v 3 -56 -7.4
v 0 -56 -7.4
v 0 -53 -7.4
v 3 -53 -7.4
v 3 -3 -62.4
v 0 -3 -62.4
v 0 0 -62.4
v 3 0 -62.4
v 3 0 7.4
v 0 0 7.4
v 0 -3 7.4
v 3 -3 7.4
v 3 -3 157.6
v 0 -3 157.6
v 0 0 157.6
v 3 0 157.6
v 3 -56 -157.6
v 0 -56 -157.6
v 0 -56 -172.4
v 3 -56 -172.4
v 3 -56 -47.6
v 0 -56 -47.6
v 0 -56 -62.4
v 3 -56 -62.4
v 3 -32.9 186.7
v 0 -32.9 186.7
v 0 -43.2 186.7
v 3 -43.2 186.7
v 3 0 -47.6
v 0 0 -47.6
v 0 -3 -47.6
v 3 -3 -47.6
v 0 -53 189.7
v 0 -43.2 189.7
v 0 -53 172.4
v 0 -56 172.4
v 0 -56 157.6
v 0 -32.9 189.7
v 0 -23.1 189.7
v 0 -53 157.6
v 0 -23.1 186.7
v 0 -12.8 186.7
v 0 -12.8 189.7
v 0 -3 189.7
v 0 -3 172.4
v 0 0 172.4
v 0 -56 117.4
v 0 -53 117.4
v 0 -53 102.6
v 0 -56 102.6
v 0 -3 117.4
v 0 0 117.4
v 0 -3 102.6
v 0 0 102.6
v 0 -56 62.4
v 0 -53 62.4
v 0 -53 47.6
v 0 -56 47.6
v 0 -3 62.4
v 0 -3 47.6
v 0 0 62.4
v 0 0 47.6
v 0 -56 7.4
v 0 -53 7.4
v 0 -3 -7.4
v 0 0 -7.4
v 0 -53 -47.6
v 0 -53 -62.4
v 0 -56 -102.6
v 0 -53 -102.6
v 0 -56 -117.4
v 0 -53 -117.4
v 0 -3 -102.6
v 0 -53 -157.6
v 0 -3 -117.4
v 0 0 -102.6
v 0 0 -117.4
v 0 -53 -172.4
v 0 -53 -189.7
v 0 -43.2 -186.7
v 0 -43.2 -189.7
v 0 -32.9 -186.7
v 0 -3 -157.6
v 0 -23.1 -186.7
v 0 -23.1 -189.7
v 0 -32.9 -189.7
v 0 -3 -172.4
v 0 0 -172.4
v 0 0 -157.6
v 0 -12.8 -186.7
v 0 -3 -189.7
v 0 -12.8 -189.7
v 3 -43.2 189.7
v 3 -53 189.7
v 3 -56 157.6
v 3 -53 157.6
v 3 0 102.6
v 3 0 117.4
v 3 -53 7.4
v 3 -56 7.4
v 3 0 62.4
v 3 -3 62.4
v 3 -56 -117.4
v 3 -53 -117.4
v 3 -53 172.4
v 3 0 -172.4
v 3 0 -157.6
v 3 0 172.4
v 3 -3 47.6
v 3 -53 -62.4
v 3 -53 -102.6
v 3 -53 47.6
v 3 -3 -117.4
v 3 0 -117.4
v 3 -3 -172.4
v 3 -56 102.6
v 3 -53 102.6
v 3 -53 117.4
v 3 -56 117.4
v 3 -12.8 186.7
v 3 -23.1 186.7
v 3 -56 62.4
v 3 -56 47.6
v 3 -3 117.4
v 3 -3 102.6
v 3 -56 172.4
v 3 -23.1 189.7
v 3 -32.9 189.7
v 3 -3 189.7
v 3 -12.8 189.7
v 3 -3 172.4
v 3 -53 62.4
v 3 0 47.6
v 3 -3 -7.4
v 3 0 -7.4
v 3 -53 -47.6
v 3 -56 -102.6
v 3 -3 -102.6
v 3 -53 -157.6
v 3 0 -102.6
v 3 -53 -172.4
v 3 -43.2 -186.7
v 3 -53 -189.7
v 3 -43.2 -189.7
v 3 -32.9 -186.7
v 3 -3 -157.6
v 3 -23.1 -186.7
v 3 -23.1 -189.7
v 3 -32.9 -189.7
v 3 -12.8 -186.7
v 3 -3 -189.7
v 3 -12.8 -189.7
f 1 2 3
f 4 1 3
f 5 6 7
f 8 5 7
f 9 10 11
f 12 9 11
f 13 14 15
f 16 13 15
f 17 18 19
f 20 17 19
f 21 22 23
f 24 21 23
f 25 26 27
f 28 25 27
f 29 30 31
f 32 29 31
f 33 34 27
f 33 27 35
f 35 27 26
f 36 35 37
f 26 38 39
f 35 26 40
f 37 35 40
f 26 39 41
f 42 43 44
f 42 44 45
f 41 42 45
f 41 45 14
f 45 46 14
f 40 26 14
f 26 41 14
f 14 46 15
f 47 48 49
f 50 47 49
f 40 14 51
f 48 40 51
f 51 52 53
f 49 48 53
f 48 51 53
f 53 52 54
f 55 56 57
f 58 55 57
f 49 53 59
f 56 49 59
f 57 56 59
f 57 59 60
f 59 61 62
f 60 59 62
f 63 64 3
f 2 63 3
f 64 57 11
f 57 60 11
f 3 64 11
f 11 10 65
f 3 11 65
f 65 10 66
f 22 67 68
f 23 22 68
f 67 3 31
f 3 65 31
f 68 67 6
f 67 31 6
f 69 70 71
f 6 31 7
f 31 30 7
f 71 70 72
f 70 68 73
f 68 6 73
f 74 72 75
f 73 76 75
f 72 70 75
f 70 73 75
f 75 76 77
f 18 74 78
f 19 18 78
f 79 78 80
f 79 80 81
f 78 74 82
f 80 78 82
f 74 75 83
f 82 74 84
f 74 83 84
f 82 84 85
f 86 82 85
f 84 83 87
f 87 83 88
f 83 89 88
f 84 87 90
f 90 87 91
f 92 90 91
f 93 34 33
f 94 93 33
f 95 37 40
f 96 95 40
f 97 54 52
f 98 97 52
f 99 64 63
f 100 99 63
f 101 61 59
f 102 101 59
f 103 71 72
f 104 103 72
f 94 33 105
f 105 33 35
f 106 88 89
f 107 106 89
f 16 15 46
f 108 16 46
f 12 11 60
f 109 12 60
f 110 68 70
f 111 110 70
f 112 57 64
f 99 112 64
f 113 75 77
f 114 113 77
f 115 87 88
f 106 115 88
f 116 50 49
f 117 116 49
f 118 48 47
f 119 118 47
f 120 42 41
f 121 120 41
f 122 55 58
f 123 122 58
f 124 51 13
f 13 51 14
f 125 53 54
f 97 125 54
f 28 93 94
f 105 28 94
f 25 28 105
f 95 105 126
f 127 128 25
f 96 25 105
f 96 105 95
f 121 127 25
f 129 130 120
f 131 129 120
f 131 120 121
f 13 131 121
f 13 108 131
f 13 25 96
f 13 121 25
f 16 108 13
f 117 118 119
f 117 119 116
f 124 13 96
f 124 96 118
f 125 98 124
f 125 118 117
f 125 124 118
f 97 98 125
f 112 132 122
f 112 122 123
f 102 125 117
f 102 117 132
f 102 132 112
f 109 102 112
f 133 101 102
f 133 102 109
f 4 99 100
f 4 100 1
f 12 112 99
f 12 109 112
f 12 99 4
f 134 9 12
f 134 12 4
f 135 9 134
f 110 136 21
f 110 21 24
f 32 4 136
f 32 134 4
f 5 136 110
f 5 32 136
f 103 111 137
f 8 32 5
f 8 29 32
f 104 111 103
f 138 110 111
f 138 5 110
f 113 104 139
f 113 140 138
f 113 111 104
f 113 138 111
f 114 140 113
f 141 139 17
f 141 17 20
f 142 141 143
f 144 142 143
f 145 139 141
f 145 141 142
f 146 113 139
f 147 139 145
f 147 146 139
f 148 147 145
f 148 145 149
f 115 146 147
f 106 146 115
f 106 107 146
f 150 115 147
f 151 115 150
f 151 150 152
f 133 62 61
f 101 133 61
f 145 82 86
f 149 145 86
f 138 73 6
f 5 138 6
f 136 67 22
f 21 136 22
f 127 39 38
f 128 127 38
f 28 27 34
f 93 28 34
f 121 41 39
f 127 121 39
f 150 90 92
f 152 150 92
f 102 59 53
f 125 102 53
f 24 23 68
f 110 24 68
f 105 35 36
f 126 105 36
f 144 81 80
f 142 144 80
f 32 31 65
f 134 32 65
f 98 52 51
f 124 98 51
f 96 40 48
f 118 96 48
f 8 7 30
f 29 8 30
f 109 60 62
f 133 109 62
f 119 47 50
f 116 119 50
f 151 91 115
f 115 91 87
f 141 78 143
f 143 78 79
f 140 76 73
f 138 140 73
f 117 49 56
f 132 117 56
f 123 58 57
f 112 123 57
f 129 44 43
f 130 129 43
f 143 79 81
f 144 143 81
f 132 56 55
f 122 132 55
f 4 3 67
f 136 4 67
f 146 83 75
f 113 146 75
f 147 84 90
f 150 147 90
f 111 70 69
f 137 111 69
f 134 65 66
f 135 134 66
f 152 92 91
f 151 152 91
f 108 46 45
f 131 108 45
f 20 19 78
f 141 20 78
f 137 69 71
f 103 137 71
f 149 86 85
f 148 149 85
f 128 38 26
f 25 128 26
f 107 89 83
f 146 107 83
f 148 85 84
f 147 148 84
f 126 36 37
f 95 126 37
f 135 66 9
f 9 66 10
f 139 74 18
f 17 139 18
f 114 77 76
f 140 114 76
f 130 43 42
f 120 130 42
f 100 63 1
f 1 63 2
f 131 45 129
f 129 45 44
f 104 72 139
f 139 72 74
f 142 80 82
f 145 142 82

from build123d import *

# Parameters (mm, degrees)
BOSS_EXTRUDE1_DEPTH = 3


with BuildPart() as part:
    # Sketch1 → Boss-Extrude1 (new body)
    with BuildSketch(Plane(origin=(0, 0, 0), x_dir=(0, 0, -1), z_dir=(1, 0, 0))):
        Polygon((7.4, 0), (-7.4, 0), (-7.4, -3), (-47.6, -3), (-47.6, 0), (-62.4, 0), (-62.4, -3), (-102.6, -3), (-102.6, 0), (-117.4, 0), (-117.4, -3), (-157.6, -3), (-157.6, 0), (-172.4, 0), (-172.4, -3), (-189.7, -3), (-189.7, -12.8), (-186.7, -12.8), (-186.7, -23.1), (-189.7, -23.1), (-189.7, -28), (-189.7, -32.9), (-186.7, -32.9), (-186.7, -43.2), (-189.7, -43.2), (-189.7, -53), (-172.4, -53), (-172.4, -56), (-157.6, -56), (-157.6, -53), (-117.4, -53), (-117.4, -56), (-102.6, -56), (-102.6, -53), (-62.4, -53), (-62.4, -56), (-47.6, -56), (-47.6, -53), (-7.4, -53), (-7.4, -56), (7.4, -56), (7.4, -53), (47.6, -53), (47.6, -56), (62.4, -56), (62.4, -53), (102.6, -53), (102.6, -56), (117.4, -56), (117.4, -53), (157.6, -53), (157.6, -56), (172.4, -56), (172.4, -53), (189.7, -53), (189.7, -43.2), (186.7, -43.2), (186.7, -32.9), (189.7, -32.9), (189.7, -28), (189.7, -23.1), (186.7, -23.1), (186.7, -12.8), (189.7, -12.8), (189.7, -3), (172.4, -3), (172.4, 0), (157.6, 0), (157.6, -3), (117.4, -3), (117.4, 0), (102.6, 0), (102.6, -3), (62.4, -3), (62.4, 0), (47.6, 0), (47.6, -3), (7.4, -3), align=None)
    extrude(amount=BOSS_EXTRUDE1_DEPTH)


solid = part.part
